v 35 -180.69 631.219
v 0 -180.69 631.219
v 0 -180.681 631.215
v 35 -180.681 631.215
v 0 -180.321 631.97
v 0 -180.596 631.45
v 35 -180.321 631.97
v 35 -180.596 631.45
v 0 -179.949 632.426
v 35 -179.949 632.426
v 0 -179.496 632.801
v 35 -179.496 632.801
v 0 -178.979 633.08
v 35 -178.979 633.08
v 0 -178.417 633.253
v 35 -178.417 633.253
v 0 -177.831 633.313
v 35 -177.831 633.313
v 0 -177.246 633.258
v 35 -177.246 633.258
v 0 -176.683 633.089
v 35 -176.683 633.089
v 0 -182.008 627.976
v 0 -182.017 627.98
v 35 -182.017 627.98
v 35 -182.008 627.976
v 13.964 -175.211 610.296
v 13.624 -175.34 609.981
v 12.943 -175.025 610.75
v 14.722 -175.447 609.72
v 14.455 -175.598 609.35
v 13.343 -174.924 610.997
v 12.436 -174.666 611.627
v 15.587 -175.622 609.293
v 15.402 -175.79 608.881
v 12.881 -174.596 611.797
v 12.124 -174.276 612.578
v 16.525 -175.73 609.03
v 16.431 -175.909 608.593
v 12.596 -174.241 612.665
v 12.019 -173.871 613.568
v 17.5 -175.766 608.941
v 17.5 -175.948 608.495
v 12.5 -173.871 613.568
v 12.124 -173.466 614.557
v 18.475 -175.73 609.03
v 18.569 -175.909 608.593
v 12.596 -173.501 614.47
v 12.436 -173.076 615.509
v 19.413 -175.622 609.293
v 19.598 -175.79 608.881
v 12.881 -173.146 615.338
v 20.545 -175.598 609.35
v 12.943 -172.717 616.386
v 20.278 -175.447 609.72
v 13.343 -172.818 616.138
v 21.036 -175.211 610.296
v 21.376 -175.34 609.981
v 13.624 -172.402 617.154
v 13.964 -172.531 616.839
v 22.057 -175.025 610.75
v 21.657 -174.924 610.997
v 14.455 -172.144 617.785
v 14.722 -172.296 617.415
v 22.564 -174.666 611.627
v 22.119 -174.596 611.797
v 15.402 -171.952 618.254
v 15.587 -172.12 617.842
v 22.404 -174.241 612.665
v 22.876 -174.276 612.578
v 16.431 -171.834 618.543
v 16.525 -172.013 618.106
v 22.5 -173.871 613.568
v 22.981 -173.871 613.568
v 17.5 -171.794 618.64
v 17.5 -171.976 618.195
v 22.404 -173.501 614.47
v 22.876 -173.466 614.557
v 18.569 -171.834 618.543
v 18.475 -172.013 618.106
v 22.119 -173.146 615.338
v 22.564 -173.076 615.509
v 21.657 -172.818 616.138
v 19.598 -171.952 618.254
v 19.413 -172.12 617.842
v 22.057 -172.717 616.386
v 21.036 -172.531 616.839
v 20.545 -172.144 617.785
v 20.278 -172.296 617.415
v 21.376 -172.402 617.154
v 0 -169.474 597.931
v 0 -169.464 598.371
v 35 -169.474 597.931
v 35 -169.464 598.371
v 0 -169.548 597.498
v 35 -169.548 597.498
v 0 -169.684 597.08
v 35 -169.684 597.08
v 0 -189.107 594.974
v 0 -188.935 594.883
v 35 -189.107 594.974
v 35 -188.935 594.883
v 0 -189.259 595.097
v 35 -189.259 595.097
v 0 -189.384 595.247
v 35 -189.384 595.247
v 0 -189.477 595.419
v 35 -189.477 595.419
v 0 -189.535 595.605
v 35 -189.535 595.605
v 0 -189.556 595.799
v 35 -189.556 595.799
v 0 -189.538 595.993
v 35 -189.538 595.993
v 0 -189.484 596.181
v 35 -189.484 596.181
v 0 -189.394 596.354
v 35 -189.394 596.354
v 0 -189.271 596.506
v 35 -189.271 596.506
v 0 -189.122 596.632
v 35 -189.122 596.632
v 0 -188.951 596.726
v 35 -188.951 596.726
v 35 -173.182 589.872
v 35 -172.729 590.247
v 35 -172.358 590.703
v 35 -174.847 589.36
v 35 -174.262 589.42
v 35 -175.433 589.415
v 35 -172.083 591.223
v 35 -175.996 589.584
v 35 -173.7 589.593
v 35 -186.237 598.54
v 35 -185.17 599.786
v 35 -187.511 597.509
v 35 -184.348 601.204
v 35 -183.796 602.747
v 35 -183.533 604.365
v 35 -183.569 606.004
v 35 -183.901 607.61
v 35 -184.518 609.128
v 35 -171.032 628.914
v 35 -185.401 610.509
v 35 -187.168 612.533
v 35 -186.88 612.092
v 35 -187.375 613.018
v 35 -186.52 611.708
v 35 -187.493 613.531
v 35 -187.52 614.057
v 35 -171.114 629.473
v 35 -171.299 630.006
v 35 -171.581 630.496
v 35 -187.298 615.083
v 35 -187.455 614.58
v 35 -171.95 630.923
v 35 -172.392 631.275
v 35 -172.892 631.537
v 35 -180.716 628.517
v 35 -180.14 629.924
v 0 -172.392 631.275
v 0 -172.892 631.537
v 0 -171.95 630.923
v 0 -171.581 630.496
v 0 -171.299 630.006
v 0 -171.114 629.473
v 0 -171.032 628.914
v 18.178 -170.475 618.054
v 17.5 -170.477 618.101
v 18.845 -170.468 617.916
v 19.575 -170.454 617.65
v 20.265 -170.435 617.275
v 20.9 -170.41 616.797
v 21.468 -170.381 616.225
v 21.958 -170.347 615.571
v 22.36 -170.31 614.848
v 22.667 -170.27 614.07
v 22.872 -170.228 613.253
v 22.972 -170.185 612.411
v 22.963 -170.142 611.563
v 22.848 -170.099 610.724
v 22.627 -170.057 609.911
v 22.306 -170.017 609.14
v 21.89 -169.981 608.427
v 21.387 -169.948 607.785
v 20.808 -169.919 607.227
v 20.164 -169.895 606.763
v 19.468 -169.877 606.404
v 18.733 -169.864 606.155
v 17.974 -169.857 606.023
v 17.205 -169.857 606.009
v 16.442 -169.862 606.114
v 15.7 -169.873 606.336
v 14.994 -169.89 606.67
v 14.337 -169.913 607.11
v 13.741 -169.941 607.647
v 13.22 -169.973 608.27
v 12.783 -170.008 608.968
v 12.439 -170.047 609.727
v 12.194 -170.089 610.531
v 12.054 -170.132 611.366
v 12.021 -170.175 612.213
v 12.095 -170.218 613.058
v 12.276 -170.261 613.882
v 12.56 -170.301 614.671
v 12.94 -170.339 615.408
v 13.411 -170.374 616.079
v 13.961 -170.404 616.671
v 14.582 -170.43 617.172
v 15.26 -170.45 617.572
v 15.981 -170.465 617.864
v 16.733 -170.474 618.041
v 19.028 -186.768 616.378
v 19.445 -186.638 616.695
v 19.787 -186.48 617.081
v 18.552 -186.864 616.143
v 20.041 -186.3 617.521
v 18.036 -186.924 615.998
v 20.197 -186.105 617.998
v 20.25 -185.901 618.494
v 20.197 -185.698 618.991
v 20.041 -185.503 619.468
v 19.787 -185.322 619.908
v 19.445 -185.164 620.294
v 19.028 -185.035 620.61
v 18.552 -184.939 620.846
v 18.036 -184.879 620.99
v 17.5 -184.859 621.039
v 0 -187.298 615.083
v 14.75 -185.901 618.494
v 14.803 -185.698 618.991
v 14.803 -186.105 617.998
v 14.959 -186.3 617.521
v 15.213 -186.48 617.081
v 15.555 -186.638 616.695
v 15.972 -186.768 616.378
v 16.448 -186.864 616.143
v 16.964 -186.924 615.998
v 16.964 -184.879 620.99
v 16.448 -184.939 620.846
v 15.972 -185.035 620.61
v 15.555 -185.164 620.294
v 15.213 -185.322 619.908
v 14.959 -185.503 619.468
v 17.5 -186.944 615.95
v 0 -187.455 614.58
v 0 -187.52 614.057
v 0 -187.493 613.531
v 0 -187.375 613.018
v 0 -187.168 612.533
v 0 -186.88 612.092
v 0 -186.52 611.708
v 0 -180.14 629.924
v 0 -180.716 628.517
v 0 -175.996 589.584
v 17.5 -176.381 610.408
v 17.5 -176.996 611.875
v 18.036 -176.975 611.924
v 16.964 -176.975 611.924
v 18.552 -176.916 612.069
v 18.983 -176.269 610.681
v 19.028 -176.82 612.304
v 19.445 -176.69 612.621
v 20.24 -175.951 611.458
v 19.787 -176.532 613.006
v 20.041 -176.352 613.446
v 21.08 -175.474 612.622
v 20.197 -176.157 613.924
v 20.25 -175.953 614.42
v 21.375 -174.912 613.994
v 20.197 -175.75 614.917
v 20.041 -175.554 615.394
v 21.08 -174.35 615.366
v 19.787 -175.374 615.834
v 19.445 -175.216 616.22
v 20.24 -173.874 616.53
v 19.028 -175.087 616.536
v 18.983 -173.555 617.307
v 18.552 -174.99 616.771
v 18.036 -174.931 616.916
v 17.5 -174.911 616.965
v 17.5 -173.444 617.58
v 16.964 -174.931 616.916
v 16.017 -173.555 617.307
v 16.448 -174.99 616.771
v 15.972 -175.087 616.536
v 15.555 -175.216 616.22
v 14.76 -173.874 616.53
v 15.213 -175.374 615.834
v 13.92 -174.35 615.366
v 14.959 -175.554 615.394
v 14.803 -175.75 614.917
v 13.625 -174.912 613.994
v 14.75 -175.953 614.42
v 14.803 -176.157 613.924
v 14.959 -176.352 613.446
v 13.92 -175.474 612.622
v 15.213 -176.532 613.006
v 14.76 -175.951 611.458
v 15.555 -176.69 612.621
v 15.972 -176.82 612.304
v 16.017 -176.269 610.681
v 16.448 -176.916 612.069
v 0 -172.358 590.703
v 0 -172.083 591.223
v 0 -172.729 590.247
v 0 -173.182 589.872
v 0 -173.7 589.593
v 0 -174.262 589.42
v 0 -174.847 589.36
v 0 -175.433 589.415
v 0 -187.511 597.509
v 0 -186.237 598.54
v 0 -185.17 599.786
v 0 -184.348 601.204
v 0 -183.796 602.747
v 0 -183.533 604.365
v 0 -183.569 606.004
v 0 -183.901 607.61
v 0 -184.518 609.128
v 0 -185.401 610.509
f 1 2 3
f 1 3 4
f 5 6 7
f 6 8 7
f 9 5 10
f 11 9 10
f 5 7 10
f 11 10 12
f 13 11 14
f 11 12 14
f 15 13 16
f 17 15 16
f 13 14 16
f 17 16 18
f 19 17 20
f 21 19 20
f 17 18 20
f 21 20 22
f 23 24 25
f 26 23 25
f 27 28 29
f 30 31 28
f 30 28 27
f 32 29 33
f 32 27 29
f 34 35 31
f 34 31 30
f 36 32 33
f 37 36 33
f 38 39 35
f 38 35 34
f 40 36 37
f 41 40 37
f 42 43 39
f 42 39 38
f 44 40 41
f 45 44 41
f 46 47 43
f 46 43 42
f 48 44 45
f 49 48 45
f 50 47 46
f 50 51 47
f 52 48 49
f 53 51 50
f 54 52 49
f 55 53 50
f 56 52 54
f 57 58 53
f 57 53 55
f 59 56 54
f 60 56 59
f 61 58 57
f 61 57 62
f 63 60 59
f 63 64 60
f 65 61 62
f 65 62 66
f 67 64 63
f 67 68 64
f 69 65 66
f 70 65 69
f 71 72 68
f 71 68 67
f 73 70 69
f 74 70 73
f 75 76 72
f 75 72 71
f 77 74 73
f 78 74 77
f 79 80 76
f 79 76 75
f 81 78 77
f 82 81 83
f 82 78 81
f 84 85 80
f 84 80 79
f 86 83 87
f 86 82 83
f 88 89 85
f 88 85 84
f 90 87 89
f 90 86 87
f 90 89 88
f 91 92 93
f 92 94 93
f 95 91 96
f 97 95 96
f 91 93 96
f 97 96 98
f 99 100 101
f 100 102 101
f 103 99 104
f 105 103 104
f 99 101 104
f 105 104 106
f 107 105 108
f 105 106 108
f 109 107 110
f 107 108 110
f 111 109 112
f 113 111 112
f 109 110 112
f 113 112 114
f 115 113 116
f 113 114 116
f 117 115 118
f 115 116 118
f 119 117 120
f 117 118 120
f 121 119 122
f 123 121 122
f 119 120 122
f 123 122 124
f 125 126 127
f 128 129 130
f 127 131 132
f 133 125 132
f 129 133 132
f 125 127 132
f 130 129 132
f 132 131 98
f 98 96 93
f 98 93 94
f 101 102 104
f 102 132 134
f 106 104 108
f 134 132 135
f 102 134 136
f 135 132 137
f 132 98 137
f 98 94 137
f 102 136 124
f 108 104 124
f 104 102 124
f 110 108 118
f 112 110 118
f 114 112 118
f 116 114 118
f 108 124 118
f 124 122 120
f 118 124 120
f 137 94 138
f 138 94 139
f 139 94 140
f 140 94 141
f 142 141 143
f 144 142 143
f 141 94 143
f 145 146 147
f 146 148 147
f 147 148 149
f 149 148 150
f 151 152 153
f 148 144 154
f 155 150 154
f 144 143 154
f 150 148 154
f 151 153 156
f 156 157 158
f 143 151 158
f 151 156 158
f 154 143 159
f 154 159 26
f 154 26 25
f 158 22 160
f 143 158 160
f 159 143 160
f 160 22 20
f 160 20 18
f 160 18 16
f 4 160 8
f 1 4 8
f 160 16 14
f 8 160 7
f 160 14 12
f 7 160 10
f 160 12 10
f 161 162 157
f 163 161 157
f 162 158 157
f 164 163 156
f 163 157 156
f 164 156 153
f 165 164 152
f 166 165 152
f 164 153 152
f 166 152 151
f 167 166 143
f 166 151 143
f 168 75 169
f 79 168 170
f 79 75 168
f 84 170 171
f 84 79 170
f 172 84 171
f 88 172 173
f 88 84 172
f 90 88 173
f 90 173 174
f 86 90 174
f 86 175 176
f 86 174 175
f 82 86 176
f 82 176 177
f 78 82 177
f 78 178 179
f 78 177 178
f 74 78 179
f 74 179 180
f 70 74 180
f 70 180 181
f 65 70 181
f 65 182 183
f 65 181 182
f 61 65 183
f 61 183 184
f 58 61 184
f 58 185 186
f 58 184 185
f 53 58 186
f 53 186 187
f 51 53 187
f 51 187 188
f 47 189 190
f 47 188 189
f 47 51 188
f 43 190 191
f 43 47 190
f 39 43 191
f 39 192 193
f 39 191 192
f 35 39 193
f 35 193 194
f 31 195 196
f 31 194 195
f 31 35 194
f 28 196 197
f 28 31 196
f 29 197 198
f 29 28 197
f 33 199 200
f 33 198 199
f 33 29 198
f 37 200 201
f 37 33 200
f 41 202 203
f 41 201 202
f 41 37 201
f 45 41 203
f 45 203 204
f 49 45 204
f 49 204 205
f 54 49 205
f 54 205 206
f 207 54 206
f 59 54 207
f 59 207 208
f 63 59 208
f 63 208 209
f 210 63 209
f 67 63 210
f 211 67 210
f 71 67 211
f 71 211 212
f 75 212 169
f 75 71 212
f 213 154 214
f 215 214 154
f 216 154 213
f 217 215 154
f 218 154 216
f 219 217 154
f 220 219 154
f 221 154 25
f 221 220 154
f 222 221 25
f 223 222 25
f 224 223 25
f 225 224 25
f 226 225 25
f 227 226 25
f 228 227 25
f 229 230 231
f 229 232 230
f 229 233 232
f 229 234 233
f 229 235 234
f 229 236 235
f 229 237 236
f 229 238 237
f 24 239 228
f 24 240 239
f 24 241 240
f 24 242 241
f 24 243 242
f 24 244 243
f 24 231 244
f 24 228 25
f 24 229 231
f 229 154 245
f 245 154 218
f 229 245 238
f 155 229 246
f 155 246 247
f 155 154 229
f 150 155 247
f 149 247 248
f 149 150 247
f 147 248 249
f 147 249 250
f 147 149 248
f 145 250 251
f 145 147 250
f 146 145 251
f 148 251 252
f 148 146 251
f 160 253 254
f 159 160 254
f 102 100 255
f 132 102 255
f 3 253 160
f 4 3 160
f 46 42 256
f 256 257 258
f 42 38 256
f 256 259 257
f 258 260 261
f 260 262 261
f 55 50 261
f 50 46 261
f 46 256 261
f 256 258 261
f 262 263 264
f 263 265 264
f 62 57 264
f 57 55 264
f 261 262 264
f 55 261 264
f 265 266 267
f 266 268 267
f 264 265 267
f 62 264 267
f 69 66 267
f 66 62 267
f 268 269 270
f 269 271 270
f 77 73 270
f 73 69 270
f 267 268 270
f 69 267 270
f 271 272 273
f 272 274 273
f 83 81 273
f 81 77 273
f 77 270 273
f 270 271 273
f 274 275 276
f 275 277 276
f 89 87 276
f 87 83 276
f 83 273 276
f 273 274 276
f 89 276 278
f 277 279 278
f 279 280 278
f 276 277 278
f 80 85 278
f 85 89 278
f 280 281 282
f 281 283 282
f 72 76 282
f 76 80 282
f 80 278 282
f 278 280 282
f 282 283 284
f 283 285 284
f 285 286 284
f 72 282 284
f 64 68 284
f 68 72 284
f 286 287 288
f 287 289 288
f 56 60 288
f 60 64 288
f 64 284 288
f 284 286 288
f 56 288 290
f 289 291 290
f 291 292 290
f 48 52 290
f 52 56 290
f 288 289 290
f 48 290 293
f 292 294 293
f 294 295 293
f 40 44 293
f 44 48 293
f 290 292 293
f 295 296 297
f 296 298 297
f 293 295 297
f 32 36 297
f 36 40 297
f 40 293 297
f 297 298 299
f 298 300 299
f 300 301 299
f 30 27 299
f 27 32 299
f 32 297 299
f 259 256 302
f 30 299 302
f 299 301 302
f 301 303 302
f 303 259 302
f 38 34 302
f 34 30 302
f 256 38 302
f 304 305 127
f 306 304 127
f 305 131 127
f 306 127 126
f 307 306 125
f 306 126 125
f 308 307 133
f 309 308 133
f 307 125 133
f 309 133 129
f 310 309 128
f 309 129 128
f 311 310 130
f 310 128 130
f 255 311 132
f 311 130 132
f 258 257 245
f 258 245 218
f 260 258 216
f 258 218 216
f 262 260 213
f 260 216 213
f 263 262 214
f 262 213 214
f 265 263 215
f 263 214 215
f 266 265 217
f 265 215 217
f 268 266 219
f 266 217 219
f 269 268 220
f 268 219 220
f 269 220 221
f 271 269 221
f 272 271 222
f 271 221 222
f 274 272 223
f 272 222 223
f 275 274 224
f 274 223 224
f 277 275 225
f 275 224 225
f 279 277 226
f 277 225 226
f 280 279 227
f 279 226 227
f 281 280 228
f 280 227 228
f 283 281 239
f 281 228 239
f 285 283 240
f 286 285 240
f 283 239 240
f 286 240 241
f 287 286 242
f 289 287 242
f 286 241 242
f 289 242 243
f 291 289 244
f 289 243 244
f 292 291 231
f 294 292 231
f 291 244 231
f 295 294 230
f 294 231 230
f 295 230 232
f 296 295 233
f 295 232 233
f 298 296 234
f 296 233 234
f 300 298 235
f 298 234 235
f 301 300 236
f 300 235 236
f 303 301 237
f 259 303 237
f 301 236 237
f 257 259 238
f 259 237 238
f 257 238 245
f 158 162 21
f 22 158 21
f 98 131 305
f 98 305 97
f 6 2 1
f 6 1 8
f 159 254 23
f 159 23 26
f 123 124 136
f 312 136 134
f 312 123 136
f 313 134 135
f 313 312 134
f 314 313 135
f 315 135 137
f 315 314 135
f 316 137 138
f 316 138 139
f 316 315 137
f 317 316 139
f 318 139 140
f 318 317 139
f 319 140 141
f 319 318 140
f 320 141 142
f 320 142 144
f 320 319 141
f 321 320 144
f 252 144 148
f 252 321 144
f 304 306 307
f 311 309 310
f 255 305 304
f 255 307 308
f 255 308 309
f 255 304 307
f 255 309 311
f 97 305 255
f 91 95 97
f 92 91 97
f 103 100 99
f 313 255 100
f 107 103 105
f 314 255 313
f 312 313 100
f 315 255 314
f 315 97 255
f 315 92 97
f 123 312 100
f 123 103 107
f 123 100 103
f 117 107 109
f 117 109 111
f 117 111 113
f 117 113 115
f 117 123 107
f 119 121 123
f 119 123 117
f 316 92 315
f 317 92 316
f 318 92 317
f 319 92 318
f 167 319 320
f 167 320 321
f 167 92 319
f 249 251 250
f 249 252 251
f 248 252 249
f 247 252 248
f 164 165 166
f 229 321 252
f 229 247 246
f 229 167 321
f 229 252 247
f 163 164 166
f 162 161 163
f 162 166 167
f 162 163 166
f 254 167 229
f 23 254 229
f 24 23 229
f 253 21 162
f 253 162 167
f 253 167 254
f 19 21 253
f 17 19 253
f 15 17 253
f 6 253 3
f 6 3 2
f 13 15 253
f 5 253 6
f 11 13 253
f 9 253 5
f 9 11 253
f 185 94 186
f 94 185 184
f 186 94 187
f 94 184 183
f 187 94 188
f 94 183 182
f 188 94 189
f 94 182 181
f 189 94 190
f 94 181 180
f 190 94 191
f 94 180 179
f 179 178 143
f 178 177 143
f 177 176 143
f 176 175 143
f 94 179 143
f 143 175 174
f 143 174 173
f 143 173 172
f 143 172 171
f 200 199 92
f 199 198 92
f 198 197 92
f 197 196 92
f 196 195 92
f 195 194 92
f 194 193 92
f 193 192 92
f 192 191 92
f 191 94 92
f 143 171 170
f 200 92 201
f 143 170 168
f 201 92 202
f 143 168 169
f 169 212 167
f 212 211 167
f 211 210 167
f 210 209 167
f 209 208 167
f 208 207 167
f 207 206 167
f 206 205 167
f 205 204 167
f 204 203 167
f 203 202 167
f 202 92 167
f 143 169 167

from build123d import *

# Parameters (mm, degrees)
PAD001_DEPTH        = 35
HOLE002_D           = 5.5
HOLE002_CSINK_D     = 10
HOLE002_CSINK_ANGLE = 90
SKETCH004_R         = 6.501169
SKETCH004_R_2       = 5.481256
POCKET_DEPTH        = 13.6312167212
SKETCH007_W         = 3.5
SKETCH007_H         = 35
POCKET002_DEPTH     = 1
CHAMFER_SIZE        = 0.99
FILLET007_R         = 3
FILLET008_R         = 1


with BuildPart() as part:
    # Sketch002 → Pad001 (new body)
    with BuildSketch(Plane.YZ):
        with BuildLine():
            Line((-188.1964293023, 612.8903873712), (-179.4587343049, 634.2262558534))
            Line((-171.1300961638, 630.8154221261), (-179.4587343049, 634.2262558534))
            Line((-169.4299601233, 597.7008988779), (-171.1300961638, 630.8154221261))
            Line((-173.2197753758, 588.446856499), (-169.4299601233, 597.7008988779))
            Line((-191.7278601338, 596.0264870041), (-173.2197753758, 588.446856499))
            ThreePointArc((-191.7278601338, 596.0264870041), (-183.7026179221, 603.1476439882), (-188.1964293023, 612.8903873712))
        make_face()
    extrude(amount=PAD001_DEPTH)

    # Hole002 (through all)
    with Locations(Plane(origin=(0, -364.0835541104, 149.1034242189), x_dir=(0, 0.3789815253, 0.9254042379), z_dir=(0, 0.9254042379, -0.3789815253))):
        with Locations((-506.967621, 13.13074), (501.9041201044, 17.5)):
            CounterSinkHole(HOLE002_D / 2, HOLE002_CSINK_D / 2, counter_sink_angle=HOLE002_CSINK_ANGLE)

    # Sketch004 (on DatumPlane) → Pocket (cut, through all)
    with BuildSketch(Plane(origin=(0, -364.0835541104, 149.1034242189), x_dir=(0, 0.3789815253, 0.9254042379), z_dir=(0, 0.9254042379, -0.3789815253))):
        with Locations((-506.967621, 13.13074)):
            Circle(SKETCH004_R)
        with Locations((501.9041201044, 17.5)):
            Circle(SKETCH004_R_2)
    extrude(amount=POCKET_DEPTH, mode=Mode.SUBTRACT)

    # Sketch007 (on Face6 of Pocket) → Pocket002 (cut)
    with BuildSketch(Plane(origin=(0, -376.1138092031, 154.0301840472), x_dir=(0, -0.3789815253, -0.9254042379), z_dir=(0, -0.9254042379, 0.3789815253))):
        with Locations((-513.9041201044, 17.5)):
            Rectangle(SKETCH007_W, SKETCH007_H)
    extrude(amount=-POCKET002_DEPTH, mode=Mode.SUBTRACT)

    # Chamfer
    chamfer_edges = [part.edges().sort_by_distance(p)[0] for p in [
        (17.5, -179.76502, 630.839711),
        (17.5, -181.091455, 627.600796),
    ]]
    chamfer(chamfer_edges, length=CHAMFER_SIZE)

    # Fillet007
    fillet007_edges = [part.edges().sort_by_distance(p)[0] for p in [
        (17.5, -173.219775, 588.446856),
        (17.5, -188.196429, 612.890387),
        (17.5, -169.42996, 597.700899),
        (17.5, -171.130096, 630.815422),
        (17.5, -179.458734, 634.226256),
    ]]
    fillet(fillet007_edges, radius=FILLET007_R)

    # Fillet008
    fillet008_edges = [part.edges().sort_by_distance(p)[0] for p in [
        (17.5, -191.72786, 596.026487),
    ]]
    fillet(fillet008_edges, radius=FILLET008_R)


solid = part.part
